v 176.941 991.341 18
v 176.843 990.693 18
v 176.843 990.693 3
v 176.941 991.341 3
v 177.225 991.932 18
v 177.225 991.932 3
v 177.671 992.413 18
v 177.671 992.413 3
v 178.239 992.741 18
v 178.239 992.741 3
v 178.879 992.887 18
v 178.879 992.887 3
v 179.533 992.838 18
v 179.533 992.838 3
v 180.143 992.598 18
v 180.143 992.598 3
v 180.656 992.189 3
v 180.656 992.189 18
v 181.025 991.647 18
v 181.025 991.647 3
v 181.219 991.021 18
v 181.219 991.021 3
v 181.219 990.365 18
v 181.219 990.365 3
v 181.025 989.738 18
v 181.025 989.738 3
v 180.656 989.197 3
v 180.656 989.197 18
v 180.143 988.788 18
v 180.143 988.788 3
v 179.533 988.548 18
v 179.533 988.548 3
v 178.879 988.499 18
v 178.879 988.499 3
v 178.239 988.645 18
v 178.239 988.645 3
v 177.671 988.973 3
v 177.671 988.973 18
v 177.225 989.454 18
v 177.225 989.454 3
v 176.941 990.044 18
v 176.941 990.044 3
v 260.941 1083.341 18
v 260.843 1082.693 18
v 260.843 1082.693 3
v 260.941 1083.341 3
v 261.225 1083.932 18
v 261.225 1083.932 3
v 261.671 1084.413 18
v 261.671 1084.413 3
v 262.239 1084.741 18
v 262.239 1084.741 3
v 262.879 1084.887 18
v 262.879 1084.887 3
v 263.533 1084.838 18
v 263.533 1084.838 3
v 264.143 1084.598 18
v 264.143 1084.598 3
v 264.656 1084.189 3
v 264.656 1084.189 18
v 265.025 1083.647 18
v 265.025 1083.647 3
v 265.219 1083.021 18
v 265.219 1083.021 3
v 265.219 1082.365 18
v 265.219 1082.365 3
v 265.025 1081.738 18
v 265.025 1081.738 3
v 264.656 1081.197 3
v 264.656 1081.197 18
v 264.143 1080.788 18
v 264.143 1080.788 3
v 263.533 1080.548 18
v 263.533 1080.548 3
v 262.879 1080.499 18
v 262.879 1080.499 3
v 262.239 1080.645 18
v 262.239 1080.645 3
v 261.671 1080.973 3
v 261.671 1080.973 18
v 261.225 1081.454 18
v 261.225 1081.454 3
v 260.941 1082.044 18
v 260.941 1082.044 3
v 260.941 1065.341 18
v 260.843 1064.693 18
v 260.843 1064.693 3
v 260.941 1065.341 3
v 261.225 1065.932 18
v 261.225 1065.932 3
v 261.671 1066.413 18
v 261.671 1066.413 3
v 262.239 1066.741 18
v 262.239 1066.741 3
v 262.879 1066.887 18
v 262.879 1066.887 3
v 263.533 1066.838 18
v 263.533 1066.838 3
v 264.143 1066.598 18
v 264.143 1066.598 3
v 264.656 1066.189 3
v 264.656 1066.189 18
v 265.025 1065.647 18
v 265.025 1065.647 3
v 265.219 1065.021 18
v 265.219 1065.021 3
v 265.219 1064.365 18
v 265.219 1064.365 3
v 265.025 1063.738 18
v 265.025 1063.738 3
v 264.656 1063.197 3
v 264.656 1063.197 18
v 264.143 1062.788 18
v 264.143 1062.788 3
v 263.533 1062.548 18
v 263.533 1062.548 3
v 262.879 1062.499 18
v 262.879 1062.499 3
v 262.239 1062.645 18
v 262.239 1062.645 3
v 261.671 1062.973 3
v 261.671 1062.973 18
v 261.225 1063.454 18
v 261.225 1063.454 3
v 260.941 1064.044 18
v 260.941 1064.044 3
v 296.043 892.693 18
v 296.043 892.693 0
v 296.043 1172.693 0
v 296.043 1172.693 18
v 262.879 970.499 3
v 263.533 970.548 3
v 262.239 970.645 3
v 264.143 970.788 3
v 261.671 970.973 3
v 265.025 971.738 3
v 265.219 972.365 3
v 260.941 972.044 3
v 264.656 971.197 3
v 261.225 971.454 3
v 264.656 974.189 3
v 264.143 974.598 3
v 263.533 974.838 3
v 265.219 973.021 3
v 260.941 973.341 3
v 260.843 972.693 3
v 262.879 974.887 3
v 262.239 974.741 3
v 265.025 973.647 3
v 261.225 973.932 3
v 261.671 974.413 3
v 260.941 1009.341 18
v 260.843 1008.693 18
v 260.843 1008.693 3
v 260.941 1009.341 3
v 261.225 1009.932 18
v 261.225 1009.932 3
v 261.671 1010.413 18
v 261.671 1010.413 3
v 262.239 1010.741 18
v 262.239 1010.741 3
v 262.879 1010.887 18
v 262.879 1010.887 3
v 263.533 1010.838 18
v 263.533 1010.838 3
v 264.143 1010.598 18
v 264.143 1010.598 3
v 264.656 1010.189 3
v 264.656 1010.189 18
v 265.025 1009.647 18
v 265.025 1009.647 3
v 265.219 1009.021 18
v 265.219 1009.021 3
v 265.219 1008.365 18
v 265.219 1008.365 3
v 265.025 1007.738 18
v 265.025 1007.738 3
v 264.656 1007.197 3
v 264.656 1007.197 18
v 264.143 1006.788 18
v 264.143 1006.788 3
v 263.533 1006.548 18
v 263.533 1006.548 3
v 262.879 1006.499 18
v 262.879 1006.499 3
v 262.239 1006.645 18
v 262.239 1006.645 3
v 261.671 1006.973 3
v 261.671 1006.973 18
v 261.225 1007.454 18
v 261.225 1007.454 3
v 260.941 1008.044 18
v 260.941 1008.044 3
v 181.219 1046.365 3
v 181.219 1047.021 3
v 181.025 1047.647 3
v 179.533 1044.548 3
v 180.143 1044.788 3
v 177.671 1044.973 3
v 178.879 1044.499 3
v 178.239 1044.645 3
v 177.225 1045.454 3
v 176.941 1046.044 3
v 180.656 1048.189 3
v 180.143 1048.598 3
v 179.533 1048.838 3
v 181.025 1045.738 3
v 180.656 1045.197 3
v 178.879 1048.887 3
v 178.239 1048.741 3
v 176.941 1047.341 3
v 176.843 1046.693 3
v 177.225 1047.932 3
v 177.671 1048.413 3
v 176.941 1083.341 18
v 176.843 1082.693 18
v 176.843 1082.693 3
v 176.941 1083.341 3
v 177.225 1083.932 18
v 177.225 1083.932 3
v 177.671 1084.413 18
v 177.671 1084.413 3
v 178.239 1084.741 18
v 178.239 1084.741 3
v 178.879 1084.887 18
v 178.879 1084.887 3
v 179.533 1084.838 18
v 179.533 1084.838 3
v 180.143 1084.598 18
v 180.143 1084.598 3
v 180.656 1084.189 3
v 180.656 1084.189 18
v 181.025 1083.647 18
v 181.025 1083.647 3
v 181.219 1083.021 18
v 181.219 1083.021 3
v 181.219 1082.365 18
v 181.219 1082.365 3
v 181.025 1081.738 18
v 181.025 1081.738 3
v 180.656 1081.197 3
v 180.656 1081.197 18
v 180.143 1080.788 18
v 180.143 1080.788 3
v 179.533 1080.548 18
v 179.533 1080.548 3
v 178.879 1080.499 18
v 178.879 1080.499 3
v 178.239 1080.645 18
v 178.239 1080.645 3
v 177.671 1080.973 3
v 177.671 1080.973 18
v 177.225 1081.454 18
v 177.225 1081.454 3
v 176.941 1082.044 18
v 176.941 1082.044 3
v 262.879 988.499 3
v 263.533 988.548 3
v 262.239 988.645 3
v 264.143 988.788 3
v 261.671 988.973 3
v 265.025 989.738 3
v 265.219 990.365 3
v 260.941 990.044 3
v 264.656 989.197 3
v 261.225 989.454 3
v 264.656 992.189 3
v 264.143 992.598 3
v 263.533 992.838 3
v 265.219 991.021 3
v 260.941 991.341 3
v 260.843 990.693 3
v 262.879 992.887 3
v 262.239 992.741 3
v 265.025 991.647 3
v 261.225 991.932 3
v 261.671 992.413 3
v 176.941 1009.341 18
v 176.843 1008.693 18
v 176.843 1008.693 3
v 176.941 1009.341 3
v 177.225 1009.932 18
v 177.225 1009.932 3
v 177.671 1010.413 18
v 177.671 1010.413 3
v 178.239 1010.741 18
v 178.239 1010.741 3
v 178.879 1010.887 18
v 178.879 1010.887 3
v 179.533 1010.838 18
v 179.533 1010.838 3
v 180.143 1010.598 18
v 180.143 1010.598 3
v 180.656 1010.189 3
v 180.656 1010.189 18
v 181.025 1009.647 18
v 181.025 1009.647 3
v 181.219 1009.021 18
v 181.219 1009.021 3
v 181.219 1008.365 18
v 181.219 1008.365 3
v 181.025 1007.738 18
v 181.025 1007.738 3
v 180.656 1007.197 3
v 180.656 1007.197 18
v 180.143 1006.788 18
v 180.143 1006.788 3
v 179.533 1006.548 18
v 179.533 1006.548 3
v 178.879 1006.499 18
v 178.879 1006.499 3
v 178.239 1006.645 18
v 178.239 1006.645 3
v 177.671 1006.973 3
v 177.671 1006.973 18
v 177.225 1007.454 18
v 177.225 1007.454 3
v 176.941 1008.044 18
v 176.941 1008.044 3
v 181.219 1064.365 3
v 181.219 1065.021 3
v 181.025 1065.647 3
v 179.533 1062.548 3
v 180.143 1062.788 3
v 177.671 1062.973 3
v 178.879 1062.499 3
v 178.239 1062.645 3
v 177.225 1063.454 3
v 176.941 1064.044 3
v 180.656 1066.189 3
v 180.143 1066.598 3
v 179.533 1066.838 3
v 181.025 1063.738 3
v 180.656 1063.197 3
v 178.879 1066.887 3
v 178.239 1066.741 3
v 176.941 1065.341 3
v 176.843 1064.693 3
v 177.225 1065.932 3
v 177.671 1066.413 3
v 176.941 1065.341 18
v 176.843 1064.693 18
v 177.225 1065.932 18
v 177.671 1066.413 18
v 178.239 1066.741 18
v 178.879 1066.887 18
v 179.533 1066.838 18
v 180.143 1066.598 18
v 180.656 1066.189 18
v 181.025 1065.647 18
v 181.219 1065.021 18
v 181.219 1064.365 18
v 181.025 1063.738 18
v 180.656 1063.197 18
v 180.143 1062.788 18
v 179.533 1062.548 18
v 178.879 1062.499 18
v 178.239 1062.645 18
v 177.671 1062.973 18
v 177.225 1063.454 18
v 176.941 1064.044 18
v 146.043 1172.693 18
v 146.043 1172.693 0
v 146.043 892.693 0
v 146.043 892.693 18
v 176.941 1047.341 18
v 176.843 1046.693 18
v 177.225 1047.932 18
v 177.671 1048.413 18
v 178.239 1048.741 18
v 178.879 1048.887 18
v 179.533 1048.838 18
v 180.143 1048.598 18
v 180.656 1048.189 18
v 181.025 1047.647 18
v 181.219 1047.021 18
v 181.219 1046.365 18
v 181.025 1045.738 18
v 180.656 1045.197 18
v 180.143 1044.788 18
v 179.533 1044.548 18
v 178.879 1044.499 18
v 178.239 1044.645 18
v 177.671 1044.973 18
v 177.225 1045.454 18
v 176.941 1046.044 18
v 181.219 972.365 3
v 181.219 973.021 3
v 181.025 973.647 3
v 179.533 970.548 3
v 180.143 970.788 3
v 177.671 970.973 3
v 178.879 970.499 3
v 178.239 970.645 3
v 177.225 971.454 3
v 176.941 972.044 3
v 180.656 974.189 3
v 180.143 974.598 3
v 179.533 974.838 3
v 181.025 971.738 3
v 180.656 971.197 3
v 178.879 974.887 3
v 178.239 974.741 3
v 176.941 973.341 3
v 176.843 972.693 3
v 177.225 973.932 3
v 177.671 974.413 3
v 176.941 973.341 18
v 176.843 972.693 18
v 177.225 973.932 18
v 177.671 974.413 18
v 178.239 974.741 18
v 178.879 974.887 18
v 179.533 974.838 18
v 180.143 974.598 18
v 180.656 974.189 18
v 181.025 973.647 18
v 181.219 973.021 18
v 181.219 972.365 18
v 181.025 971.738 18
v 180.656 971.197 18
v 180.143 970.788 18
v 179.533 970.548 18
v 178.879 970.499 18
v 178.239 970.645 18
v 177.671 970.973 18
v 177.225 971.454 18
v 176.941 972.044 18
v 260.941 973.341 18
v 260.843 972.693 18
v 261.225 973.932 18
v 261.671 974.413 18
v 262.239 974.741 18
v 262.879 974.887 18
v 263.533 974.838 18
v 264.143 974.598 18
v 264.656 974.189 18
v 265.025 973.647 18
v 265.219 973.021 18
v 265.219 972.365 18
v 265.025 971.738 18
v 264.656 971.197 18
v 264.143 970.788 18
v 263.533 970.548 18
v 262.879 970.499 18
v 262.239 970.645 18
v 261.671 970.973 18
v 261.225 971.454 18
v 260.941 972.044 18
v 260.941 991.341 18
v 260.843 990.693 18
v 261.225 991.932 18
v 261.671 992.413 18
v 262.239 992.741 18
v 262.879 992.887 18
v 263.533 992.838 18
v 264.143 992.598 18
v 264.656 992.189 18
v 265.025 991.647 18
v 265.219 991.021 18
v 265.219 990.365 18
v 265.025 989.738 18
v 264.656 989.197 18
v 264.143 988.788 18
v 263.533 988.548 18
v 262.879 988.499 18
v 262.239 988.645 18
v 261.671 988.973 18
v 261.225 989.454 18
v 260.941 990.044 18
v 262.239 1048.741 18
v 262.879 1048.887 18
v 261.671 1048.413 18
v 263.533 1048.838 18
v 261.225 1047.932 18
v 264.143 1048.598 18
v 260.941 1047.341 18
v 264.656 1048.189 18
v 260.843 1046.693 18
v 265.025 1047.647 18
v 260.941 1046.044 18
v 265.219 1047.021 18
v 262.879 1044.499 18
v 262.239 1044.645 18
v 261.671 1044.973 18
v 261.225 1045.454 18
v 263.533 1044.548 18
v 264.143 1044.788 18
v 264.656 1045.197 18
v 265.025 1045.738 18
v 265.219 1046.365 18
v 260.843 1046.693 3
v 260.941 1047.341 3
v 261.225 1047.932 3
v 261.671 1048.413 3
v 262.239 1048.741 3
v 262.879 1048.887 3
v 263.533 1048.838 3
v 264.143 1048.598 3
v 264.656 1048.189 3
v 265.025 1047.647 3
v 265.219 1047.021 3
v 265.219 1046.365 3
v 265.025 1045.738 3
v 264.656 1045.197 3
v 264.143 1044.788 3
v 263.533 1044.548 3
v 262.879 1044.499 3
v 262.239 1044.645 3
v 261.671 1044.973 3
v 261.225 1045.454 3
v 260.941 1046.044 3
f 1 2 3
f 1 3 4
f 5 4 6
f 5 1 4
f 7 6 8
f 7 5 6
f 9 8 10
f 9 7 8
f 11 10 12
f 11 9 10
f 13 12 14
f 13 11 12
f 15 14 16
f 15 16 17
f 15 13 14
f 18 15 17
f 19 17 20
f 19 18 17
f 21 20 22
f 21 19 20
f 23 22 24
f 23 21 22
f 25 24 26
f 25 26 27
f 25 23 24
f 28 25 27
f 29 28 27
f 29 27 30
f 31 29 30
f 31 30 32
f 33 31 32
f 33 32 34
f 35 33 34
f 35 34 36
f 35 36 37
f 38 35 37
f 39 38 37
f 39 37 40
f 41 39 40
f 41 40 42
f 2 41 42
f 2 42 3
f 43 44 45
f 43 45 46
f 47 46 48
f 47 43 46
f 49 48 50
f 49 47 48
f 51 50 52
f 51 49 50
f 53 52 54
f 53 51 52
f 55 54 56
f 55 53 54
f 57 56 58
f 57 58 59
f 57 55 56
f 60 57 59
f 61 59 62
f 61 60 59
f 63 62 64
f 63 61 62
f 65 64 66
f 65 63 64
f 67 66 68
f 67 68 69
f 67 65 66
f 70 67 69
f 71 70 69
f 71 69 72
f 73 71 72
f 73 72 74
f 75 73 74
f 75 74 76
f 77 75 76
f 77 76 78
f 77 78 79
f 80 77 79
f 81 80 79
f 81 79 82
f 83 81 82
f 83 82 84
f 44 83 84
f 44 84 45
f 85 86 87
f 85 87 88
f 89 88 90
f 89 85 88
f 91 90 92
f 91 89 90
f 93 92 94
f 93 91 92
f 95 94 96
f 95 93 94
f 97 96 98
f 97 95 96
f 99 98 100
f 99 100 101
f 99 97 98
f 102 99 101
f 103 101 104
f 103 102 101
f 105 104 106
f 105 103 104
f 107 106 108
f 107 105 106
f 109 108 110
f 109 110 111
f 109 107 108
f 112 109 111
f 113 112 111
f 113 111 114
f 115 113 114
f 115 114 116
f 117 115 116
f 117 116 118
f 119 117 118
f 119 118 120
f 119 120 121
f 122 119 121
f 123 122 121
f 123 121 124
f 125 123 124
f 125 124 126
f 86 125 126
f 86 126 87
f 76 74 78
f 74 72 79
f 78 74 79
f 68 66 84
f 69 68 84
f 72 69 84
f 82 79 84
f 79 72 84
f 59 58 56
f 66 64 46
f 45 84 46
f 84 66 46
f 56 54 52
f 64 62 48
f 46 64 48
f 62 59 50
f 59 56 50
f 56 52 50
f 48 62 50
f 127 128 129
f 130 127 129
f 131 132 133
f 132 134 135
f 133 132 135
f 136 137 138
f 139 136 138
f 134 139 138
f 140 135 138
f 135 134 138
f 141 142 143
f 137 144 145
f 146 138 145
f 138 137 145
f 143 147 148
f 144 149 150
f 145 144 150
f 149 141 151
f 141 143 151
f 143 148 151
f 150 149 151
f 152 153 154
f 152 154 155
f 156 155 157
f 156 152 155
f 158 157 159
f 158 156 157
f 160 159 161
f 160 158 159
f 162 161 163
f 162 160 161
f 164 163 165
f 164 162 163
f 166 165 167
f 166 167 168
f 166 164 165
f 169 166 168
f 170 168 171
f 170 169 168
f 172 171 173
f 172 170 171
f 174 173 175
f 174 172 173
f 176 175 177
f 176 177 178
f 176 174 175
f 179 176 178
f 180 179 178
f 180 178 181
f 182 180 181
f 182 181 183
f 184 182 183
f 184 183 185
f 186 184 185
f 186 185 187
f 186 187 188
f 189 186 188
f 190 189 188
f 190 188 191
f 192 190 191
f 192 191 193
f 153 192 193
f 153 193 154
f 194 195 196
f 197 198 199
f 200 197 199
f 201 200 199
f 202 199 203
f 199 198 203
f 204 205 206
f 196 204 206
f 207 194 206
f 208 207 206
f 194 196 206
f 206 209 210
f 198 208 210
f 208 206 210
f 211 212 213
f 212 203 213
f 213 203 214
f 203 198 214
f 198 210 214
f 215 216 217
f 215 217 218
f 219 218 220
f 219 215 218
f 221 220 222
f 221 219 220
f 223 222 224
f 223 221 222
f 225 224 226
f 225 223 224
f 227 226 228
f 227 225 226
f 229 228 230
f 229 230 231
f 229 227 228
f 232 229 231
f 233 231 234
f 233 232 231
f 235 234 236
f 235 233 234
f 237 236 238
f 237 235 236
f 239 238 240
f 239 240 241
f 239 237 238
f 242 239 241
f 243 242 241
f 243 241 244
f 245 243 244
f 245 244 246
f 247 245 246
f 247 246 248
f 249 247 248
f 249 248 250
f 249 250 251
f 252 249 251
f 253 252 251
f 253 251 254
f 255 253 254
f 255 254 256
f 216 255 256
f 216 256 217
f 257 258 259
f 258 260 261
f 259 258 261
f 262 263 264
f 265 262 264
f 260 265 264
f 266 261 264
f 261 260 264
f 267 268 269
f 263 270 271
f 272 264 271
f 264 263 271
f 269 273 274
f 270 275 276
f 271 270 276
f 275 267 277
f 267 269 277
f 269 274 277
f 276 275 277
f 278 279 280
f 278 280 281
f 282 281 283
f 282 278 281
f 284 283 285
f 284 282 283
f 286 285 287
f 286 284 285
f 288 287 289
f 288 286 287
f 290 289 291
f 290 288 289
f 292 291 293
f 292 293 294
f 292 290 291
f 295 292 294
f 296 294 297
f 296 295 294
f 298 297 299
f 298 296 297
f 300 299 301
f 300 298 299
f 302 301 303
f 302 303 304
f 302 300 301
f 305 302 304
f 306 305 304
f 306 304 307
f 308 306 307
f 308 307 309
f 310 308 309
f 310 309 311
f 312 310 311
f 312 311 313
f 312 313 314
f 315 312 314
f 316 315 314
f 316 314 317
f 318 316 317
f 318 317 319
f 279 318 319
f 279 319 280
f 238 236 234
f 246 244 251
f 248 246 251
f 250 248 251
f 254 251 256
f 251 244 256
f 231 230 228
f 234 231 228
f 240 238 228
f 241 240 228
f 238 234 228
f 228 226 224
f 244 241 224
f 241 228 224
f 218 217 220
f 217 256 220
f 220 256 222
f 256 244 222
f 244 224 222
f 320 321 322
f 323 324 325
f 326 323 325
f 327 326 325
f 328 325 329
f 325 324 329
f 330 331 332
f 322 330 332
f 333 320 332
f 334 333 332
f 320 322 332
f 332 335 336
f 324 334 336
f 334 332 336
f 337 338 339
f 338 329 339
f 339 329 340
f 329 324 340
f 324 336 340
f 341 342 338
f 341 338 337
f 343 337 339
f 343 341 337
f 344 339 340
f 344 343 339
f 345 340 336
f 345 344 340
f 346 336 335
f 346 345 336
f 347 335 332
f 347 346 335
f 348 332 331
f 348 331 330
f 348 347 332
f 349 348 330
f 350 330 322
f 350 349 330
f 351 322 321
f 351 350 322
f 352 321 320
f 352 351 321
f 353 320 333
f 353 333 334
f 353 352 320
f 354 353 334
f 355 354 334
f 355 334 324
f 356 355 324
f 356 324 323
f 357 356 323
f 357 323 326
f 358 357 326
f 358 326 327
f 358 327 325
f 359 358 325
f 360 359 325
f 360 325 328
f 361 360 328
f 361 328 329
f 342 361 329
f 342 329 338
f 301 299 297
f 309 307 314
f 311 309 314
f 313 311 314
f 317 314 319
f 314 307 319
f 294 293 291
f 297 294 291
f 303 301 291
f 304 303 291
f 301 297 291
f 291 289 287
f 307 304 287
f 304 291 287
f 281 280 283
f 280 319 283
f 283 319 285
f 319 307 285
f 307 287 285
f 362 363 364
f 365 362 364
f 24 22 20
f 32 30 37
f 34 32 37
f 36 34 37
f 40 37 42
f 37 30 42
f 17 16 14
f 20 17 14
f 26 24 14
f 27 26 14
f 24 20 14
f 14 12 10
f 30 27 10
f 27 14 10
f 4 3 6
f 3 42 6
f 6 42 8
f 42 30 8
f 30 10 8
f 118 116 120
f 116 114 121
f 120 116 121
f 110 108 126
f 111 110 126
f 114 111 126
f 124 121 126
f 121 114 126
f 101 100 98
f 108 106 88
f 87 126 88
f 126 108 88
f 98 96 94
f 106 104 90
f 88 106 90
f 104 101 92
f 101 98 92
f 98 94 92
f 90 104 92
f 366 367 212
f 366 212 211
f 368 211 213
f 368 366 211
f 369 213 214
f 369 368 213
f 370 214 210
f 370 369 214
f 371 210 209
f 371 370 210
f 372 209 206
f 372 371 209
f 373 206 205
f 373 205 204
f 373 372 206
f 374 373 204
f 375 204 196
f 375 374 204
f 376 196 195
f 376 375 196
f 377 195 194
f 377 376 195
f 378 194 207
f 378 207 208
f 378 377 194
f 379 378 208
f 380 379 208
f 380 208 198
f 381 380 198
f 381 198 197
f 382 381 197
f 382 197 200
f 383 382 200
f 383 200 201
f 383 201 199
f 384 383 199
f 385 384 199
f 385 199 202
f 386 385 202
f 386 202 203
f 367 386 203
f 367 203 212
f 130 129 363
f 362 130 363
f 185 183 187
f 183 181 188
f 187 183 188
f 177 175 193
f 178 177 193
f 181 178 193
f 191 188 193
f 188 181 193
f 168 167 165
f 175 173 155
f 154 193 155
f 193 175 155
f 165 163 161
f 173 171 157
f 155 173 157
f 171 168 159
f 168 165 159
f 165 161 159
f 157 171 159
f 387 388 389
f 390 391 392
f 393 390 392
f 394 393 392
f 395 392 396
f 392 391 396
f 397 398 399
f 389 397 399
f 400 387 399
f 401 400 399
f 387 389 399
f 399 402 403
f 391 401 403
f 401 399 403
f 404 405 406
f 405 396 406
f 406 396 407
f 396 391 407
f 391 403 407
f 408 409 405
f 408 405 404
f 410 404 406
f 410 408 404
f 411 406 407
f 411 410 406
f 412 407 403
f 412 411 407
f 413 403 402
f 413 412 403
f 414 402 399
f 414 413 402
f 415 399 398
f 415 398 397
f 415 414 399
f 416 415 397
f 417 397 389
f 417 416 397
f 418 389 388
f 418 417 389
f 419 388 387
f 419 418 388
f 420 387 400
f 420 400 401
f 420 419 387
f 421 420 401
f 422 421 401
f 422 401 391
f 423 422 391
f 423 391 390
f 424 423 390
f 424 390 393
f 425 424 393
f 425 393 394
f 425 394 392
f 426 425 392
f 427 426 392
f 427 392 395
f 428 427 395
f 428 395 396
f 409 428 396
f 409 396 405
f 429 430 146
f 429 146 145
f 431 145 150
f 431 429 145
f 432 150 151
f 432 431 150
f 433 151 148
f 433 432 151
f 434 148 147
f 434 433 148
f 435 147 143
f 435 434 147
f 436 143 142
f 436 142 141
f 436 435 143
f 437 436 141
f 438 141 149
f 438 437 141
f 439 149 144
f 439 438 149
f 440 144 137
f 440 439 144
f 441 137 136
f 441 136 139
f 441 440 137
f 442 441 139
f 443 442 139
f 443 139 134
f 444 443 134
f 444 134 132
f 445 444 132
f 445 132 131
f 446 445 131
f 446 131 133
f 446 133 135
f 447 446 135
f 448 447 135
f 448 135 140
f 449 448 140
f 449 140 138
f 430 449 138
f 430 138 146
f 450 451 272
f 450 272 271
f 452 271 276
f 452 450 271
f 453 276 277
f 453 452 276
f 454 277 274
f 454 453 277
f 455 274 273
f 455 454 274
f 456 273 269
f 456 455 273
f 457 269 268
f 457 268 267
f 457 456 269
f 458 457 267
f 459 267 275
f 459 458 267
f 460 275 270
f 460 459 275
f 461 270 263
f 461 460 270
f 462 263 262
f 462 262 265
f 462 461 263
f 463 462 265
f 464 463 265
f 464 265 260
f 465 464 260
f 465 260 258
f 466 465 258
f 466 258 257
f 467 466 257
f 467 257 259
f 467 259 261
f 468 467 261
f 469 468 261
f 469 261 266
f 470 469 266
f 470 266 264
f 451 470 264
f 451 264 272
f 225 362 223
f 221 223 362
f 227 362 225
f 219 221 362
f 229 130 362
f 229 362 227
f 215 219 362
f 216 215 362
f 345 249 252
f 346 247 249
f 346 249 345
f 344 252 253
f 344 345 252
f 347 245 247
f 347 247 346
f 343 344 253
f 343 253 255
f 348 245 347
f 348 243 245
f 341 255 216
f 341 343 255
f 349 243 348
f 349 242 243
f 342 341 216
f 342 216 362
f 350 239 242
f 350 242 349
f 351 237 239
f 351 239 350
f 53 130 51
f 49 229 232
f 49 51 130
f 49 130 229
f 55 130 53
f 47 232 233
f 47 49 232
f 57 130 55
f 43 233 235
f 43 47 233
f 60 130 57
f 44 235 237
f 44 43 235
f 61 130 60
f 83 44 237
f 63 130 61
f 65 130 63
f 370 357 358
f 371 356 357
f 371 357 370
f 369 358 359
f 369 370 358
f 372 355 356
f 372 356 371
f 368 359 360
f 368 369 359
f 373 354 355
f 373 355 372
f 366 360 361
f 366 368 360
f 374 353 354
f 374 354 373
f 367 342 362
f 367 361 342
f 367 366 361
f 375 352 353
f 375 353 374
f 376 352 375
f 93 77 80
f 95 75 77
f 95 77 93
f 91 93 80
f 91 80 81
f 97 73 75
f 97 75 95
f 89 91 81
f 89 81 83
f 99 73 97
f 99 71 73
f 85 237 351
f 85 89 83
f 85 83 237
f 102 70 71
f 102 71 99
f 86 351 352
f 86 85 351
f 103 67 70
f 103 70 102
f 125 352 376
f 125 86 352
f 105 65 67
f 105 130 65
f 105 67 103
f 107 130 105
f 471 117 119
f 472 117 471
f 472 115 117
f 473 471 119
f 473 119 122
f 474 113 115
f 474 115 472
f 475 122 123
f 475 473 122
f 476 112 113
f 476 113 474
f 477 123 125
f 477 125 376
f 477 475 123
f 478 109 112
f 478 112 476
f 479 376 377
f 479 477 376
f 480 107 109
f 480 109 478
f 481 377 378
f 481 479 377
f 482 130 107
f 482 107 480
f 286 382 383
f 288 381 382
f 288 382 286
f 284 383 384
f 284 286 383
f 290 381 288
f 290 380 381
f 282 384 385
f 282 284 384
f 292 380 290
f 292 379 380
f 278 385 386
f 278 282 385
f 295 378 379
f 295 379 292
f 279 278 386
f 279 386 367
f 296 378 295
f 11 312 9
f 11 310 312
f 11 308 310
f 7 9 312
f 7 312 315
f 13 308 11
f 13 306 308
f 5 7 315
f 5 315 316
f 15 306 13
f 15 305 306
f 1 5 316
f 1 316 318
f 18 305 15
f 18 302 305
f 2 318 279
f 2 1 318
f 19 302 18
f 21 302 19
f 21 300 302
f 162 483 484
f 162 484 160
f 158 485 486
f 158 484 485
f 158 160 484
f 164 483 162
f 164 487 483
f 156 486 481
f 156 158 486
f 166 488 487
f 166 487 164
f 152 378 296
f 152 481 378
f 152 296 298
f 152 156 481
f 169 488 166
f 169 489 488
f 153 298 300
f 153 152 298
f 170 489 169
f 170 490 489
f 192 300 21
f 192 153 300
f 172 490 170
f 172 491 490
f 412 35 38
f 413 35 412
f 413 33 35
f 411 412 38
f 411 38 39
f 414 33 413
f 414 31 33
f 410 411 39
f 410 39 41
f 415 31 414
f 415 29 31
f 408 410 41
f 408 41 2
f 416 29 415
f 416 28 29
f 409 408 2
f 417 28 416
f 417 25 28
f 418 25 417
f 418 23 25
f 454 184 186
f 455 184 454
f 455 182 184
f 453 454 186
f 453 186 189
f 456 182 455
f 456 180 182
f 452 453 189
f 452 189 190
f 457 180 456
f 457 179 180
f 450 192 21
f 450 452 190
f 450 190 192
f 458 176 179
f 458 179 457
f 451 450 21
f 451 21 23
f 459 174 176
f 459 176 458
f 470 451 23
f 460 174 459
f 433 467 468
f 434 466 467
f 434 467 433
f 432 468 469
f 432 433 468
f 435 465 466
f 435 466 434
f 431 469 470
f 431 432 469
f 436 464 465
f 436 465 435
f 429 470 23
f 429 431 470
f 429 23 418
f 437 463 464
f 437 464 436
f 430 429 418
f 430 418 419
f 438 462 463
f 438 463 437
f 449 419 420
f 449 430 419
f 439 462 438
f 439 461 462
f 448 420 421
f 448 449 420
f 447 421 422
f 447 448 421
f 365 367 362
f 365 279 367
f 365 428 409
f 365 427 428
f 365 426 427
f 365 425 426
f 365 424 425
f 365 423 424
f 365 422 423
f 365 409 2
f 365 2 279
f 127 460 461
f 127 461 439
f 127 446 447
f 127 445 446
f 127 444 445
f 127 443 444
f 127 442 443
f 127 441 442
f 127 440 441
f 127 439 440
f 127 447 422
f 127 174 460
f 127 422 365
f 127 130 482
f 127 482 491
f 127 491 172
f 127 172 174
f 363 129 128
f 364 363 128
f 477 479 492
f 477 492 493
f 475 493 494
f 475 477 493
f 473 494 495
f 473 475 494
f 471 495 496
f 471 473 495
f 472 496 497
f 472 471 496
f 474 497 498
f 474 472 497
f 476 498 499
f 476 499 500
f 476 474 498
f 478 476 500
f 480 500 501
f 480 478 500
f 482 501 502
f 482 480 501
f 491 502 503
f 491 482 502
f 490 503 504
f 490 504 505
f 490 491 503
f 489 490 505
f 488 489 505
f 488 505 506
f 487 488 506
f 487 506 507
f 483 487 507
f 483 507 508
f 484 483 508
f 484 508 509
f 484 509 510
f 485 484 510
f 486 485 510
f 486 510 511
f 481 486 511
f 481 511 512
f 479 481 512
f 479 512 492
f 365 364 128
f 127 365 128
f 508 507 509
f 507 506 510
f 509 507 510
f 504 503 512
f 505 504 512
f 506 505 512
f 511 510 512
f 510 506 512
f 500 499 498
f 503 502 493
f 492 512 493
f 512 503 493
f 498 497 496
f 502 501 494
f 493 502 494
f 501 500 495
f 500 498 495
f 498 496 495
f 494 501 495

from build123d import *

# Parameters (mm, degrees)
BOSS_EXTRUDE1_DEPTH = 18
F_3DSKETCH2_R       = 2.2
CUT_EXTRUDE1_DEPTH  = 18


with BuildPart() as part:
    # 3DSketch1 → Boss-Extrude1 (new body)
    with BuildSketch(Plane(origin=(296.043137644, 1172.692882005, 0), x_dir=(-0.4722214125154188, -0.8814799700287822, 0), z_dir=(0, 0, 1))):
        Polygon((0, 0), (70.833211877, -132.221995504), (317.647603485, 0), (246.814391608, 132.221995504), align=None)
    extrude(amount=BOSS_EXTRUDE1_DEPTH)

    # 3DSketch2 → Cut-Extrude1 (cut)
    with BuildSketch(Plane(origin=(179.043137644, 1082.692882005, 21), x_dir=(0.6069136033622309, -0.7947678139267296, 0), z_dir=(0, 0, -1))):
        with Locations(Location((0, 0, 0), (0, 0, 127.366669413))):
            Circle(F_3DSKETCH2_R)
        with Locations(Location((14.305820651, 10.924444861, 0), (0, 0, 127.366669413))):
            Circle(F_3DSKETCH2_R)
        with Locations(Location((28.611641301, 21.848889721, 0), (0, 0, 127.366669413))):
            Circle(F_3DSKETCH2_R)
        with Locations(Location((58.812818231, 44.911606649, 0), (0, 0, 127.366669413))):
            Circle(F_3DSKETCH2_R)
        with Locations(Location((73.118638881, 55.836051509, 0), (0, 0, 127.366669413))):
            Circle(F_3DSKETCH2_R)
        with Locations(Location((87.424459532, 66.76049637, 0), (0, 0, 127.366669413))):
            Circle(F_3DSKETCH2_R)
        with Locations(Location((138.405202214, 0, 0), (0, 0, 127.366669413))):
            Circle(F_3DSKETCH2_R)
        with Locations(Location((124.099381564, -10.924444861, 0), (0, 0, 127.366669413))):
            Circle(F_3DSKETCH2_R)
        with Locations(Location((109.793560913, -21.848889721, 0), (0, 0, 127.366669413))):
            Circle(F_3DSKETCH2_R)
        with Locations(Location((79.592383984, -44.911606649, 0), (0, 0, 127.366669413))):
            Circle(F_3DSKETCH2_R)
        with Locations(Location((50.980742682, -66.76049637, 0), (0, 0, 127.366669413))):
            Circle(F_3DSKETCH2_R)
        with Locations(Location((65.286563333, -55.836051509, 0), (0, 0, 127.366669413))):
            Circle(F_3DSKETCH2_R)
    extrude(amount=CUT_EXTRUDE1_DEPTH, mode=Mode.SUBTRACT)


solid = part.part
